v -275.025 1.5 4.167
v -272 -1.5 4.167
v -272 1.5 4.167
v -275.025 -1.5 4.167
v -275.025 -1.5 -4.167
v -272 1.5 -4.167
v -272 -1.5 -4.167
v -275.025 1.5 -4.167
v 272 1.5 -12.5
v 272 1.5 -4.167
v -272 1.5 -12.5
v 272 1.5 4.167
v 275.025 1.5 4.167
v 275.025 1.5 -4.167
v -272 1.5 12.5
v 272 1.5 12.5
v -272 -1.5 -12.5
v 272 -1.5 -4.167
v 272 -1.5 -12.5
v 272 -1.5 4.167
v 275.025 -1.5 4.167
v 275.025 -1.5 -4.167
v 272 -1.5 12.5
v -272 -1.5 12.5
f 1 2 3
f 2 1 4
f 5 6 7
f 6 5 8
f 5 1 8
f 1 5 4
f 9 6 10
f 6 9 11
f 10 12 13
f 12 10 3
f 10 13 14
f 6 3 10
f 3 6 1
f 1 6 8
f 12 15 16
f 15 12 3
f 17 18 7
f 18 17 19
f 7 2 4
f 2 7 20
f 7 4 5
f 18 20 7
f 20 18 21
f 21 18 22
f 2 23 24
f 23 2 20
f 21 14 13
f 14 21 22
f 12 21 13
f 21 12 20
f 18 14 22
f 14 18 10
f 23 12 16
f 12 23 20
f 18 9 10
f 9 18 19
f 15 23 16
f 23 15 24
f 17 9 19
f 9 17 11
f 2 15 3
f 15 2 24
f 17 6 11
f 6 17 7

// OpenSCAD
// file: ../config.scad
// all measures in millimeters

// rendering quality
$fn = 200;
nothing = 0.05;

// material to cut from
material_z = 3;

// wall configuration: bounding box measures
wall_x = 550;
wall_y = 30;
wall_z = 400;

// length of the foot towards the front and back of the wall (asymmetrical)
foot_y_back = 100;
foot_y_front = 175;

// foot height
foot_z = 25;

// rounded corners at front and back of the foot
foot_round_y = 20;

// number of support beams
support_count = 6;

// height of a support beam
support_z = 25;

// pot configuration: outer measures of the top opening
pot_x = 70;
pot_y = 70;
pot_z = 50;

// pots have hooks to hang at the wall supports
hook_width = 10;
// main file
include <../config.scad>;

module wall_horizontal()
{
    // beam
    cube([
        wall_x - 2*material_z,
        material_z,
        support_z
        ], center=true);

    // noses
    for (x = [
            - wall_x/2 + material_z/2,
            + wall_x/2 - material_z/2
            ])
        translate([x, 0, 0])
        cube([
            material_z + nothing,
            material_z,
            support_z/3
            ], center=true);
}

wall_horizontal();
